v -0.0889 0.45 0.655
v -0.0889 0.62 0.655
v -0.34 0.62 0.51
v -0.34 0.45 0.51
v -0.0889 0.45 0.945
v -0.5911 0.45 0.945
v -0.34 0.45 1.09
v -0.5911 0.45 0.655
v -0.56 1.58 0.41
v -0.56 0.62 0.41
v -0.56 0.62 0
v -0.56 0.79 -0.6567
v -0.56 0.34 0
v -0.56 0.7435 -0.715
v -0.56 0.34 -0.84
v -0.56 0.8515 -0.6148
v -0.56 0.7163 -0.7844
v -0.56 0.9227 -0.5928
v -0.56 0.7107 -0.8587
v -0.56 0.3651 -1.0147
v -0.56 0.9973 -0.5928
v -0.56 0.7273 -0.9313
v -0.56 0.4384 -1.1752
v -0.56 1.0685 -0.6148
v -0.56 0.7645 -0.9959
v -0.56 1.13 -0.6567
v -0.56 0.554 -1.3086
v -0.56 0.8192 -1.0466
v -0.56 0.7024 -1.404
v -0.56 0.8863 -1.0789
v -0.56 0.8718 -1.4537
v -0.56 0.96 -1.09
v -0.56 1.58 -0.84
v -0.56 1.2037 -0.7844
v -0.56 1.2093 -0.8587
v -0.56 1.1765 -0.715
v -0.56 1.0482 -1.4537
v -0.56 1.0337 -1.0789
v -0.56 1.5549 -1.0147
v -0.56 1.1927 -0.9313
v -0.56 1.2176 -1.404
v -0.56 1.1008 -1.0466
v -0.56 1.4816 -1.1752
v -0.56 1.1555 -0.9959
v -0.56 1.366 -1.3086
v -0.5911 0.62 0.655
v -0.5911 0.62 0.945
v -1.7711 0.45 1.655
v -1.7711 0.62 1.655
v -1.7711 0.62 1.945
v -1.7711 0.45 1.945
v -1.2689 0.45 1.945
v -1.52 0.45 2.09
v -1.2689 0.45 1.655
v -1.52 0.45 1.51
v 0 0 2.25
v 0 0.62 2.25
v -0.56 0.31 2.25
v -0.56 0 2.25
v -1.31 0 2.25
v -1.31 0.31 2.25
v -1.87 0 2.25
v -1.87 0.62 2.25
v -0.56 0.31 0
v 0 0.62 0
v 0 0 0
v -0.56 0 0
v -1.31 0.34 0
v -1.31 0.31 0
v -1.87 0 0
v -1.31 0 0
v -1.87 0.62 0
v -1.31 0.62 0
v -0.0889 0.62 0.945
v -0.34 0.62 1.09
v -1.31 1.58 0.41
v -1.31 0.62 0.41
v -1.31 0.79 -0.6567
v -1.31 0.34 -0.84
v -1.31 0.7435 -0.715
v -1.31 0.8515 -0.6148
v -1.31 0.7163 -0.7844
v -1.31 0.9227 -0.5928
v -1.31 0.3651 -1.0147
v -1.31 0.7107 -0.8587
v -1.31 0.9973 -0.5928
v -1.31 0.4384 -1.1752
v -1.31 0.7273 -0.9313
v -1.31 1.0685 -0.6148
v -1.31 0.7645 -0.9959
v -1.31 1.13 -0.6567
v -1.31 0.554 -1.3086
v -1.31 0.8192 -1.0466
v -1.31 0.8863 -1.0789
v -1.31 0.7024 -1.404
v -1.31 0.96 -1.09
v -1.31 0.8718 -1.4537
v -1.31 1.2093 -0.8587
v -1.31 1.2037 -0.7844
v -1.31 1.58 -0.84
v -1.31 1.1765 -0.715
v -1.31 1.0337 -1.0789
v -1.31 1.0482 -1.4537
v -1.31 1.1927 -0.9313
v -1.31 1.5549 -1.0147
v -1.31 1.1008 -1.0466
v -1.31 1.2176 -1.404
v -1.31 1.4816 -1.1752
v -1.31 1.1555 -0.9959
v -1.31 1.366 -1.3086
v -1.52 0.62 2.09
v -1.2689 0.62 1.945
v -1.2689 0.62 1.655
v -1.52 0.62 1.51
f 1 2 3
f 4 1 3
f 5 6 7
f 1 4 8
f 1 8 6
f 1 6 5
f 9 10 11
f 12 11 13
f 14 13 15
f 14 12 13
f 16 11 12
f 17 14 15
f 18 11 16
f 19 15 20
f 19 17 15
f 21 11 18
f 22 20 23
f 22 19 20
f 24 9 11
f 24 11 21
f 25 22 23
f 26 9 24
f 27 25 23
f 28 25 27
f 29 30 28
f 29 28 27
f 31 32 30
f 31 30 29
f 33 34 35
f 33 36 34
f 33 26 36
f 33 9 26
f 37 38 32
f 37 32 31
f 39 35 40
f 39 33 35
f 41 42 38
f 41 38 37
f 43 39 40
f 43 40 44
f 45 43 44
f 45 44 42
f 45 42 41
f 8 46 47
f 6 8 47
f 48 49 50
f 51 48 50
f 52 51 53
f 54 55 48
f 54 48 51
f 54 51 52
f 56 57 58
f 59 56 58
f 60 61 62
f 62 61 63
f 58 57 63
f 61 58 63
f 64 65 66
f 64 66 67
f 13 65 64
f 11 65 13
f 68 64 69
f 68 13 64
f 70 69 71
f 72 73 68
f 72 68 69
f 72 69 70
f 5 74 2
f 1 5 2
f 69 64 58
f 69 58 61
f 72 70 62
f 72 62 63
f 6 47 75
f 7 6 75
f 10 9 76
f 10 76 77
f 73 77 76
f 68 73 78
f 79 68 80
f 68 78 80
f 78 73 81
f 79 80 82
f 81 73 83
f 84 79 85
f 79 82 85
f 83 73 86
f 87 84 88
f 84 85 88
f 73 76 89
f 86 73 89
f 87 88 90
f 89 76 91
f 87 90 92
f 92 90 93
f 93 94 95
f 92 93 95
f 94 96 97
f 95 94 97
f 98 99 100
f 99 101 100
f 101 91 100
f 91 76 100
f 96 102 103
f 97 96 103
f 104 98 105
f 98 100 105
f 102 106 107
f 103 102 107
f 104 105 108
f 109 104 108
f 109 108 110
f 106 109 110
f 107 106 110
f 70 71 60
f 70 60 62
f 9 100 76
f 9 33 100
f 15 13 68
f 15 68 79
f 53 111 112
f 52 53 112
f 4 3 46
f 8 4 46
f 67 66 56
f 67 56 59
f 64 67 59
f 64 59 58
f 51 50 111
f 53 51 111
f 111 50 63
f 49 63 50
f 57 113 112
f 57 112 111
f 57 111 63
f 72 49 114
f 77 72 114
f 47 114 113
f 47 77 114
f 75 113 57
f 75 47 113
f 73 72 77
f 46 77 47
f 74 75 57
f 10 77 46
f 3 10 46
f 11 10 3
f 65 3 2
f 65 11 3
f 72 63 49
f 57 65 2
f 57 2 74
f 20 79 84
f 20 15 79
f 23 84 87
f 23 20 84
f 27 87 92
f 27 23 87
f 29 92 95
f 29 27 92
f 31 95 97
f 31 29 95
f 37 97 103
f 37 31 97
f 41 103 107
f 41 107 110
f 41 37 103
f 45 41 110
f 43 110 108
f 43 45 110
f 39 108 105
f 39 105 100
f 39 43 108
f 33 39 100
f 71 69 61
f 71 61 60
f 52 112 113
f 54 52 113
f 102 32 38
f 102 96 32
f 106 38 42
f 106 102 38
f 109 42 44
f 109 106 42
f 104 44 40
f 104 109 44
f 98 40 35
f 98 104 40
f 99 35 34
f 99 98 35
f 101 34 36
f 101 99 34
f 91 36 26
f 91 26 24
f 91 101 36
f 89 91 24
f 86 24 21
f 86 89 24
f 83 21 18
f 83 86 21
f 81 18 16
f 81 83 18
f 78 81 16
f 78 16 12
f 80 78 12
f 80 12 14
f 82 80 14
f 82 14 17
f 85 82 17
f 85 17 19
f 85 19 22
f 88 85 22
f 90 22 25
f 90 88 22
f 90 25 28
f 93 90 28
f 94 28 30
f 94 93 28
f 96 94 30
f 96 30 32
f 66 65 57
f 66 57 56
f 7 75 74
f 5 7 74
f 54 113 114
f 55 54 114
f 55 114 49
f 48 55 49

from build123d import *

# Parameters (mm, degrees)
SALIENTE_EXTRUIR1_DEPTH = 2.25
CROQUIS2_R              = 0.25
SALIENTE_EXTRUIR2_DEPTH = 0.375
CORTAR_EXTRUIR1_DEPTH   = 0.17


with BuildPart() as part:
    # Croquis1 → Saliente-Extruir1 (new body)
    with BuildSketch(Plane.XY):
        Polygon((-1.31, 0), (-1.87, 0), (-1.87, 0.62), (0, 0.62), (0, 0), (-0.56, 0), (-0.56, 0.31), (-1.31, 0.31), align=None)
    extrude(amount=SALIENTE_EXTRUIR1_DEPTH)

    # Croquis2 → Saliente-Extruir2 (add, symmetric)
    with BuildSketch(Plane(origin=(-0.935, 0, 0), x_dir=(0, 0, -1), z_dir=(1, 0, 0))):
        with BuildLine():
            Line((0.84, 1.58), (-0.41, 1.58))
            Line((-0.41, 1.58), (-0.41, 0.62))
            Line((-0.41, 0.62), (-0.41, 0.34))
            Line((-0.41, 0.34), (0.84, 0.34))
            ThreePointArc((0.84, 0.34), (1.46, 0.96), (0.84, 1.58))
        make_face()
        with Locations((0.84, 0.96)):
            Circle(CROQUIS2_R, mode=Mode.SUBTRACT)
    extrude(amount=SALIENTE_EXTRUIR2_DEPTH, both=True)

    # Croquis3 → Cortar-Extruir1 (cut)
    with BuildSketch(Plane(origin=(0, 0.62, 0), x_dir=(1, 0, 0), z_dir=(0, 1, 0))):
        Polygon((-0.088852633, -0.945), (-0.088852633, -0.655), (-0.34, -0.51), (-0.591147367, -0.655), (-0.591147367, -0.945), (-0.34, -1.09), align=None)
        Polygon((-1.268852633, -1.945), (-1.268852633, -1.655), (-1.52, -1.51), (-1.771147367, -1.655), (-1.771147367, -1.945), (-1.52, -2.09), align=None)
    extrude(amount=-CORTAR_EXTRUIR1_DEPTH, mode=Mode.SUBTRACT)


solid = part.part
